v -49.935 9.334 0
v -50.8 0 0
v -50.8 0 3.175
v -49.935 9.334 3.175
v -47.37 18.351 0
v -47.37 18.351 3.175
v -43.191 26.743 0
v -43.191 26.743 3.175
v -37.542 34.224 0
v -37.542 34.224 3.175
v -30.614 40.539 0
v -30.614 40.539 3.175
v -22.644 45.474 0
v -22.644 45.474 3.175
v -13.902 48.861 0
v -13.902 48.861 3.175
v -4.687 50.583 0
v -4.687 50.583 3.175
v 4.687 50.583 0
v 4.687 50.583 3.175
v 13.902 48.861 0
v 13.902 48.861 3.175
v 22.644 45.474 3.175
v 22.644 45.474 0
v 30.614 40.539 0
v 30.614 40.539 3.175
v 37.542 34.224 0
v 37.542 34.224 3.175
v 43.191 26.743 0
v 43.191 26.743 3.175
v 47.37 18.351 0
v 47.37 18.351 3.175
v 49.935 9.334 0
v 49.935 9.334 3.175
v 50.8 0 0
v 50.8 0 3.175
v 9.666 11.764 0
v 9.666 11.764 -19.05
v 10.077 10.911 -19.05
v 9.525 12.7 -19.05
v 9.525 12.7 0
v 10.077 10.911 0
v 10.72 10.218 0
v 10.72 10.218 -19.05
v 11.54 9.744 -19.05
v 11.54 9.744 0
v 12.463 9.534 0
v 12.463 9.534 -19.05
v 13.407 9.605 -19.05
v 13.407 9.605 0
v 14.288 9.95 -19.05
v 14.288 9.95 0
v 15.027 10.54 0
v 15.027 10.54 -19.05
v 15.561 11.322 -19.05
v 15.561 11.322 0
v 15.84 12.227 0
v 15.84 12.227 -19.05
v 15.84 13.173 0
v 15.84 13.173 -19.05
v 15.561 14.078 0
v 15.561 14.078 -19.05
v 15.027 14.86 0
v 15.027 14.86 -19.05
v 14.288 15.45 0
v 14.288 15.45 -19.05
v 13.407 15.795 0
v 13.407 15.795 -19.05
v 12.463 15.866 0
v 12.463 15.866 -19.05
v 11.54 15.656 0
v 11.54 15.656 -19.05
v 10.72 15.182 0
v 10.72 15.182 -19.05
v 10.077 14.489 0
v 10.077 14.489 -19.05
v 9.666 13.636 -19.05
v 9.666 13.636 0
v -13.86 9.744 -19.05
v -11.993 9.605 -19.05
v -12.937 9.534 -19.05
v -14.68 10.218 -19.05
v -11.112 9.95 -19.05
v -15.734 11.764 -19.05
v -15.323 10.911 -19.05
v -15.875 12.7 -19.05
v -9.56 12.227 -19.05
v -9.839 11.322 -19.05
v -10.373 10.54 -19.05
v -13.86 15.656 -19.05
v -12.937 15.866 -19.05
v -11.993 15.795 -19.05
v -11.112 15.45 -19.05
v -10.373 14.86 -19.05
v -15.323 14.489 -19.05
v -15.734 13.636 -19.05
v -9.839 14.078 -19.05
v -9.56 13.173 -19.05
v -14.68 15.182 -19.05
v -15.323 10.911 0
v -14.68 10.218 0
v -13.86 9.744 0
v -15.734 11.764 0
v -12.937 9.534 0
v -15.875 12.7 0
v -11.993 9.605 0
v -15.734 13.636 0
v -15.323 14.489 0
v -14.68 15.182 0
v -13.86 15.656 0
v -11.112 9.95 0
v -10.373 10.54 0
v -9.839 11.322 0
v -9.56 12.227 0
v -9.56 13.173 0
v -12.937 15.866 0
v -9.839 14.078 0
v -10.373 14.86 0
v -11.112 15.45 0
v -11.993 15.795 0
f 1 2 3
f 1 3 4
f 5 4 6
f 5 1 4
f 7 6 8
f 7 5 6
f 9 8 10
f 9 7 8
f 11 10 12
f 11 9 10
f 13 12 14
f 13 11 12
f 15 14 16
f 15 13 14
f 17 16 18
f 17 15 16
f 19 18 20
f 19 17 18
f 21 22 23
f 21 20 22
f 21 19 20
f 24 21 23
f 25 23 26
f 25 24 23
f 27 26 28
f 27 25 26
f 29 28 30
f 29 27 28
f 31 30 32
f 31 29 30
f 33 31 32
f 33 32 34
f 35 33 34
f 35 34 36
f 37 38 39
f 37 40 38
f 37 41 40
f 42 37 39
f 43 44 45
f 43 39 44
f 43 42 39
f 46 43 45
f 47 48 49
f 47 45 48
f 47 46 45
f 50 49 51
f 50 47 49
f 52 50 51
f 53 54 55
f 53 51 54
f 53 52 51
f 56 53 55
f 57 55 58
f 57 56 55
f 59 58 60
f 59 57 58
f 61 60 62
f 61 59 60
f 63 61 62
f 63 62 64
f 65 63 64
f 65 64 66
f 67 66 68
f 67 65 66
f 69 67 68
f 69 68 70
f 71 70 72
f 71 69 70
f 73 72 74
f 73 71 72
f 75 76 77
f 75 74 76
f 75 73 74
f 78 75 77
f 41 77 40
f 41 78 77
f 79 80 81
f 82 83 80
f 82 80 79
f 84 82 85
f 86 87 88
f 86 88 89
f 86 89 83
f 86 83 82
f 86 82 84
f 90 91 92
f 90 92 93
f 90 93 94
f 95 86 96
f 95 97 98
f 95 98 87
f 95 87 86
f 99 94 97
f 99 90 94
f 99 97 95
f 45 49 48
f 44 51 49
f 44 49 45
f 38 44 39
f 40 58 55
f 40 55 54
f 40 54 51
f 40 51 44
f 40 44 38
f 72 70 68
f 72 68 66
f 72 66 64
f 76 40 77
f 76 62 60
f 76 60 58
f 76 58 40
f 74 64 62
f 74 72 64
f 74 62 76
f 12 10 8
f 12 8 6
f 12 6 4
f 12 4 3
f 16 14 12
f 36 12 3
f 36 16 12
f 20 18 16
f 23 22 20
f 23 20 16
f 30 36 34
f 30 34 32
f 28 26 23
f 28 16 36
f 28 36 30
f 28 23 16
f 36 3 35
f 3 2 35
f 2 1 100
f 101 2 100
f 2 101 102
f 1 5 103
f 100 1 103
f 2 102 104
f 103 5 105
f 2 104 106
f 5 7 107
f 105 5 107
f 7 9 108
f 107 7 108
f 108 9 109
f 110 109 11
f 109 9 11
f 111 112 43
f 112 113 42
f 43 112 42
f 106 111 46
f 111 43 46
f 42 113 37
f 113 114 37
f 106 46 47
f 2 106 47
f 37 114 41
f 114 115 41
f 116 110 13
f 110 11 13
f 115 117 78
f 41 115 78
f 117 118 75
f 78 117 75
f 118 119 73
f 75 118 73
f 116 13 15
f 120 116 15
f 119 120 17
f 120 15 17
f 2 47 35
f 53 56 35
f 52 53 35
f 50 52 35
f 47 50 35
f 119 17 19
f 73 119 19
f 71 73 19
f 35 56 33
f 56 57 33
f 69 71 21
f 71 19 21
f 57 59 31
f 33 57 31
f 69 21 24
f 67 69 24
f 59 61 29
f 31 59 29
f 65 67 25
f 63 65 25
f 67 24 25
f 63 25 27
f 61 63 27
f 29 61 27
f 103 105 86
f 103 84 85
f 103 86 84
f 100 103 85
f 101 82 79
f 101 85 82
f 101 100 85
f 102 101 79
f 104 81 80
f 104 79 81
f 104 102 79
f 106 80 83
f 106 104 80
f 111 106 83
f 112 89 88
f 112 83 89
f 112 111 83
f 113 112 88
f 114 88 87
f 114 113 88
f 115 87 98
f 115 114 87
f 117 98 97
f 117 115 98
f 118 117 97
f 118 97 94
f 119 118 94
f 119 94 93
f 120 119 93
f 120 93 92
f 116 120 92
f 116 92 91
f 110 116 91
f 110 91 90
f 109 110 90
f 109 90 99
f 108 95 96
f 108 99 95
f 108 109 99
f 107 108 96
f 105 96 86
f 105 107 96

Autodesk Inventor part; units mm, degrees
ref_plane "YZ Plane" through (0, 0, 0) normal (1, 0, 0) x (0, 1, 0)
ref_plane "XZ Plane" through (0, 0, 0) normal (0, 1, 0) x (-1, 0, 0)
ref_plane "XY Plane" through (0, 0, 0) normal (0, 0, 1) x (1, 0, 0)
sketch "Sketch1" plane through (0, 0, 0) normal (0, 0, 1) x (1, 0, 0)
  arc A0 (50.8, 0) -> (-50.8, 0) centre (0, 0) ccw
  line L0 (0, 0) -> (50.8, 0)
  line L1 (0, 0) -> (-50.8, 0)
  dimension "d0" = 101.6
extrude "Extrusion1" add sketch "Sketch1" along normal blind 3.175
sketch "Sketch4" plane through (0, 0, 0) normal (0, 0, -1) x (-1, 0, 0)
  line L0 (0, 0) -> (0, 12.7) construction
  line L1 (0, 12.7) -> (12.7, 12.7) construction
  circle A0 centre (12.7, 12.7) radius 3.175
  circle A1 centre (-12.7, 12.7) radius 3.175
  dimension "d15" = 12.7
  dimension "d16" = 12.7
  dimension "d17" = 6.35
extrude "Extrusion5" add sketch "Sketch4" along normal blind 19.05
sketch "Sketch5" plane through (0, 0, 3.175) normal (0, 0, 1) x (1, 0, 0)
  line L0 (-2.5936, 17.577) -> (2.4467, 17.6618)
  line L1 (2.4467, 17.6618) -> (5.0403, 13.3391)
  line L2 (5.0403, 13.3391) -> (2.5936, 8.9317)
  line L3 (2.5936, 8.9317) -> (-2.4467, 8.8469)
  line L4 (-2.4467, 8.8469) -> (-5.0403, 13.1696)
  line L5 (-5.0403, 13.1696) -> (-2.5936, 17.577)
  line L6 (0, 0) -> (0, 21.7215) construction
  point P0 (0, 13.2543)
  dimension "d22" = 4.3656
  dimension "d23" = 0
properties part number "Rear"
